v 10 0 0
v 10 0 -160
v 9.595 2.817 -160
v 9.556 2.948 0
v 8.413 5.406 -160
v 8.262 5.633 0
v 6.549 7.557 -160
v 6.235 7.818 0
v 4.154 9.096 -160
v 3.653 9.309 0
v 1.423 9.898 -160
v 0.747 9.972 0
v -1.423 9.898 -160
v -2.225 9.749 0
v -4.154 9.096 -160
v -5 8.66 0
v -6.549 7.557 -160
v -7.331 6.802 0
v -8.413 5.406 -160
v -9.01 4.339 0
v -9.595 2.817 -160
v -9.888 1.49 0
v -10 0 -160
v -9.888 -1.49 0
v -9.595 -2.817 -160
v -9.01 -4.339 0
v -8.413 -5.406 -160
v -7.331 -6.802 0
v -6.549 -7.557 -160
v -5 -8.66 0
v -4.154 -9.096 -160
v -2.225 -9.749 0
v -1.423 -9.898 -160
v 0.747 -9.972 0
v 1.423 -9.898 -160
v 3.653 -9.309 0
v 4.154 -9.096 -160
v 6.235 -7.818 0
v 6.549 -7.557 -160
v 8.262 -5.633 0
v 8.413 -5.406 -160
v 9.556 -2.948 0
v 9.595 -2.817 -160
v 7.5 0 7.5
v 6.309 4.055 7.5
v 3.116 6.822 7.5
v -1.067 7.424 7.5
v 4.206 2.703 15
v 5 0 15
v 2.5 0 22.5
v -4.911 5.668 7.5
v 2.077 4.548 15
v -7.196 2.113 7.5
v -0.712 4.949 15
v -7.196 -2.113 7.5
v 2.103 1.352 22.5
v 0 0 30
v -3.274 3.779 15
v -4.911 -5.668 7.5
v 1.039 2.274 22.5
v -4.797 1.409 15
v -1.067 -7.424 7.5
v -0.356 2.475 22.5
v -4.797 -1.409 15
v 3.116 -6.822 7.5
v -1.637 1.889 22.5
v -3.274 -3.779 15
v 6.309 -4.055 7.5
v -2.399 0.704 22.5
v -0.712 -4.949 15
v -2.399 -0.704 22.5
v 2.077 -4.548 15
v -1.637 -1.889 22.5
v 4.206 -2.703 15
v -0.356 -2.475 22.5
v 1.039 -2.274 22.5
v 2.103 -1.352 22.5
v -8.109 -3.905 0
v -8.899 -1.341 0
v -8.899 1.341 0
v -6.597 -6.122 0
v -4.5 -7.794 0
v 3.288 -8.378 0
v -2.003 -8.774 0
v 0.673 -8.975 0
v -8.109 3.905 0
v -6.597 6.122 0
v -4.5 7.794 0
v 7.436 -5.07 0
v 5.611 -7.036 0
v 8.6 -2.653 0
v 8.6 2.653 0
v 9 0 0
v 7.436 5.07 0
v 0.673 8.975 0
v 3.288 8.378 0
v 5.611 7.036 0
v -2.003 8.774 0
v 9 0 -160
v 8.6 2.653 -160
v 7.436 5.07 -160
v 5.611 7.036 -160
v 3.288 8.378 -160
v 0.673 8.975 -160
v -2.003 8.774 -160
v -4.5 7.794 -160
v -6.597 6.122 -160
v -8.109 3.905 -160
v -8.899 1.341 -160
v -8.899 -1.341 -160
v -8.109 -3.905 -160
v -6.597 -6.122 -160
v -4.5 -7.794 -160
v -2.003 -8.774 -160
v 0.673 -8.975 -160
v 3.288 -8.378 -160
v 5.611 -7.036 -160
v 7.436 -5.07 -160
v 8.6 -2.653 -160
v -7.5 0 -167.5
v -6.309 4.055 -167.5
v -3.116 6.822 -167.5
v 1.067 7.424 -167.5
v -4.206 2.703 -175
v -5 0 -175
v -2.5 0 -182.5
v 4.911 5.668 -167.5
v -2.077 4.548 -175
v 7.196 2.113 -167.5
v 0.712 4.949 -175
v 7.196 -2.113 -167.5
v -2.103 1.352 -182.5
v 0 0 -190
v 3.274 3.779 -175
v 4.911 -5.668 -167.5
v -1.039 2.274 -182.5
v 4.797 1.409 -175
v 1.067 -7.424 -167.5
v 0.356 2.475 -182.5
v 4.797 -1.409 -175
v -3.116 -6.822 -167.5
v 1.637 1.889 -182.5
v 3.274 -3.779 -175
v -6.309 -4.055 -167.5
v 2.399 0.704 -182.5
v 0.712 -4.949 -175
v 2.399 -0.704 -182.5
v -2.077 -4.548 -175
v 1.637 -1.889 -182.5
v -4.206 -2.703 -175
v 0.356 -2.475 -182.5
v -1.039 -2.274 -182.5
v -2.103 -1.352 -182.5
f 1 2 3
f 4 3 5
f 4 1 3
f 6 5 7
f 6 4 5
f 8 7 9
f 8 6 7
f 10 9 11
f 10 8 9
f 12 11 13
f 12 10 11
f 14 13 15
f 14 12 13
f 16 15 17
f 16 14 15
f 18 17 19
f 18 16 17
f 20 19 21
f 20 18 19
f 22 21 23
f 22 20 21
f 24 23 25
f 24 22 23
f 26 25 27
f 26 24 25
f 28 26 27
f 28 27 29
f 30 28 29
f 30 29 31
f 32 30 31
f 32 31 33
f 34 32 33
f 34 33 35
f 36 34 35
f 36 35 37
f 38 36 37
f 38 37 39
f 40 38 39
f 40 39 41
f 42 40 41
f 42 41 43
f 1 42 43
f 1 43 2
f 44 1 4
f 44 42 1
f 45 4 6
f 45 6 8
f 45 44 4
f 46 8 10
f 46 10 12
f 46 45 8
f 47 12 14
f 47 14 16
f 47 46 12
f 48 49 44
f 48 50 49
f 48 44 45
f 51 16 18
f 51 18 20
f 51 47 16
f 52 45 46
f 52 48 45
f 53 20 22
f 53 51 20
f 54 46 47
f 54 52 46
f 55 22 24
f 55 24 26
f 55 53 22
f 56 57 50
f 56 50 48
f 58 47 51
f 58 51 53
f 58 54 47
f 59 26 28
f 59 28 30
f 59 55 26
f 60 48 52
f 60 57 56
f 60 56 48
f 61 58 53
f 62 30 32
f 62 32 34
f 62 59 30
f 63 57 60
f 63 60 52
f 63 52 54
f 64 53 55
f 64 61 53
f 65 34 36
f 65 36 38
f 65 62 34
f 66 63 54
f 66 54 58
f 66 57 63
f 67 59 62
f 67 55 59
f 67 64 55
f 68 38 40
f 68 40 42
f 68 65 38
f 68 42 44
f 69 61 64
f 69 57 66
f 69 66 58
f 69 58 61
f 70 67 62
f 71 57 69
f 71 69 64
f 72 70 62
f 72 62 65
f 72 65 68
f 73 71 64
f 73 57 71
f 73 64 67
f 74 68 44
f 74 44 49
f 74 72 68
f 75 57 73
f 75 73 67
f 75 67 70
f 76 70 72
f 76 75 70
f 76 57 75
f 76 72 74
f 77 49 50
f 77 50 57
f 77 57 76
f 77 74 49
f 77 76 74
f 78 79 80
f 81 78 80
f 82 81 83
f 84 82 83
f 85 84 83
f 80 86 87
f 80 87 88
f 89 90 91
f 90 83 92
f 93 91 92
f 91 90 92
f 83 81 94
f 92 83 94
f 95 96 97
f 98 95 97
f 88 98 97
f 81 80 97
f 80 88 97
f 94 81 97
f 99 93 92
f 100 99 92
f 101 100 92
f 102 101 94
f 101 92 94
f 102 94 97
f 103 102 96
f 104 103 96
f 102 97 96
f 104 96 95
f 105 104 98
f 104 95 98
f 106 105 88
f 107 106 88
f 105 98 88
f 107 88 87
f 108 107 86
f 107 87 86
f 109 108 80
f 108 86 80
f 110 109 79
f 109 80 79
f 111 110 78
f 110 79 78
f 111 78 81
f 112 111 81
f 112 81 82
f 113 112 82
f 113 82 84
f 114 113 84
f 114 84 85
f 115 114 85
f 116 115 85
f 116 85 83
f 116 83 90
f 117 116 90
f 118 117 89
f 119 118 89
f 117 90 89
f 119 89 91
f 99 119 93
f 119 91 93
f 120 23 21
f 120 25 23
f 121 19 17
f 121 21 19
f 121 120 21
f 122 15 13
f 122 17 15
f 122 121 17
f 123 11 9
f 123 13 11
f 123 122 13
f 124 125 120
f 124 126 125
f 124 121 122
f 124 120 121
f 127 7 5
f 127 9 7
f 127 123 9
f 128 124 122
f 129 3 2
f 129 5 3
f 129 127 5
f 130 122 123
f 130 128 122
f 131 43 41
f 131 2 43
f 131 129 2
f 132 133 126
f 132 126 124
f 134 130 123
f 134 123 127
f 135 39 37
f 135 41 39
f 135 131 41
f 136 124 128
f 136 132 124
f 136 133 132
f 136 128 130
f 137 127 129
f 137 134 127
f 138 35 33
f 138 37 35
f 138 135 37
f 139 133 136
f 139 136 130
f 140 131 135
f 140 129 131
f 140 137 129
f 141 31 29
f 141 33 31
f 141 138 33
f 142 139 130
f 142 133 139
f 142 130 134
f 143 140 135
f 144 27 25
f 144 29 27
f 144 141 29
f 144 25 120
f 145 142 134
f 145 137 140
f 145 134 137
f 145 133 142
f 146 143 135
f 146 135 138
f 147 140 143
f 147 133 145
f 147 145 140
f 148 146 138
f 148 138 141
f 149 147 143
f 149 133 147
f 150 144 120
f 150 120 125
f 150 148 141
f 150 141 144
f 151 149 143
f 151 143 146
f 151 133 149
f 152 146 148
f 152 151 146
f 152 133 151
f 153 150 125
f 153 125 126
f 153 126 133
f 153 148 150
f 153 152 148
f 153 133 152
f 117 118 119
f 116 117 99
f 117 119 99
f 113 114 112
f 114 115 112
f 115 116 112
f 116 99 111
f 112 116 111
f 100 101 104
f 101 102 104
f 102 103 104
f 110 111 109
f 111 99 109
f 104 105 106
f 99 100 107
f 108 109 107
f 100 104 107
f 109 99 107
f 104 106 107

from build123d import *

# Parameters (mm, degrees)
SKETCH1_R           = 10
SKETCH1_R_2         = 9
BOSS_EXTRUDE1_DEPTH = 160
SKETCH3_R           = 10
SKETCH7_R           = 10


with BuildPart() as part:
    # Sketch1 → Boss-Extrude1 (new body)
    with BuildSketch(Plane.XY):
        Circle(SKETCH1_R)
        Circle(SKETCH1_R_2, mode=Mode.SUBTRACT)
    extrude(amount=-BOSS_EXTRUDE1_DEPTH)

    # Sketch3 → Loft3 section 0
    with BuildSketch(Plane.XY, mode=Mode.PRIVATE) as loft3_s0:
        Circle(SKETCH3_R)
    loft([loft3_s0.sketch, Vertex(0, 0, 30)])

    # Sketch7 → Loft4 section 0
    with BuildSketch(Plane(origin=(0, 0, -160), x_dir=(-1, 0, 0), z_dir=(0, 0, -1)), mode=Mode.PRIVATE) as loft4_s0:
        Circle(SKETCH7_R)
    loft([loft4_s0.sketch, Vertex(0, 0, -190)])


solid = part.part
